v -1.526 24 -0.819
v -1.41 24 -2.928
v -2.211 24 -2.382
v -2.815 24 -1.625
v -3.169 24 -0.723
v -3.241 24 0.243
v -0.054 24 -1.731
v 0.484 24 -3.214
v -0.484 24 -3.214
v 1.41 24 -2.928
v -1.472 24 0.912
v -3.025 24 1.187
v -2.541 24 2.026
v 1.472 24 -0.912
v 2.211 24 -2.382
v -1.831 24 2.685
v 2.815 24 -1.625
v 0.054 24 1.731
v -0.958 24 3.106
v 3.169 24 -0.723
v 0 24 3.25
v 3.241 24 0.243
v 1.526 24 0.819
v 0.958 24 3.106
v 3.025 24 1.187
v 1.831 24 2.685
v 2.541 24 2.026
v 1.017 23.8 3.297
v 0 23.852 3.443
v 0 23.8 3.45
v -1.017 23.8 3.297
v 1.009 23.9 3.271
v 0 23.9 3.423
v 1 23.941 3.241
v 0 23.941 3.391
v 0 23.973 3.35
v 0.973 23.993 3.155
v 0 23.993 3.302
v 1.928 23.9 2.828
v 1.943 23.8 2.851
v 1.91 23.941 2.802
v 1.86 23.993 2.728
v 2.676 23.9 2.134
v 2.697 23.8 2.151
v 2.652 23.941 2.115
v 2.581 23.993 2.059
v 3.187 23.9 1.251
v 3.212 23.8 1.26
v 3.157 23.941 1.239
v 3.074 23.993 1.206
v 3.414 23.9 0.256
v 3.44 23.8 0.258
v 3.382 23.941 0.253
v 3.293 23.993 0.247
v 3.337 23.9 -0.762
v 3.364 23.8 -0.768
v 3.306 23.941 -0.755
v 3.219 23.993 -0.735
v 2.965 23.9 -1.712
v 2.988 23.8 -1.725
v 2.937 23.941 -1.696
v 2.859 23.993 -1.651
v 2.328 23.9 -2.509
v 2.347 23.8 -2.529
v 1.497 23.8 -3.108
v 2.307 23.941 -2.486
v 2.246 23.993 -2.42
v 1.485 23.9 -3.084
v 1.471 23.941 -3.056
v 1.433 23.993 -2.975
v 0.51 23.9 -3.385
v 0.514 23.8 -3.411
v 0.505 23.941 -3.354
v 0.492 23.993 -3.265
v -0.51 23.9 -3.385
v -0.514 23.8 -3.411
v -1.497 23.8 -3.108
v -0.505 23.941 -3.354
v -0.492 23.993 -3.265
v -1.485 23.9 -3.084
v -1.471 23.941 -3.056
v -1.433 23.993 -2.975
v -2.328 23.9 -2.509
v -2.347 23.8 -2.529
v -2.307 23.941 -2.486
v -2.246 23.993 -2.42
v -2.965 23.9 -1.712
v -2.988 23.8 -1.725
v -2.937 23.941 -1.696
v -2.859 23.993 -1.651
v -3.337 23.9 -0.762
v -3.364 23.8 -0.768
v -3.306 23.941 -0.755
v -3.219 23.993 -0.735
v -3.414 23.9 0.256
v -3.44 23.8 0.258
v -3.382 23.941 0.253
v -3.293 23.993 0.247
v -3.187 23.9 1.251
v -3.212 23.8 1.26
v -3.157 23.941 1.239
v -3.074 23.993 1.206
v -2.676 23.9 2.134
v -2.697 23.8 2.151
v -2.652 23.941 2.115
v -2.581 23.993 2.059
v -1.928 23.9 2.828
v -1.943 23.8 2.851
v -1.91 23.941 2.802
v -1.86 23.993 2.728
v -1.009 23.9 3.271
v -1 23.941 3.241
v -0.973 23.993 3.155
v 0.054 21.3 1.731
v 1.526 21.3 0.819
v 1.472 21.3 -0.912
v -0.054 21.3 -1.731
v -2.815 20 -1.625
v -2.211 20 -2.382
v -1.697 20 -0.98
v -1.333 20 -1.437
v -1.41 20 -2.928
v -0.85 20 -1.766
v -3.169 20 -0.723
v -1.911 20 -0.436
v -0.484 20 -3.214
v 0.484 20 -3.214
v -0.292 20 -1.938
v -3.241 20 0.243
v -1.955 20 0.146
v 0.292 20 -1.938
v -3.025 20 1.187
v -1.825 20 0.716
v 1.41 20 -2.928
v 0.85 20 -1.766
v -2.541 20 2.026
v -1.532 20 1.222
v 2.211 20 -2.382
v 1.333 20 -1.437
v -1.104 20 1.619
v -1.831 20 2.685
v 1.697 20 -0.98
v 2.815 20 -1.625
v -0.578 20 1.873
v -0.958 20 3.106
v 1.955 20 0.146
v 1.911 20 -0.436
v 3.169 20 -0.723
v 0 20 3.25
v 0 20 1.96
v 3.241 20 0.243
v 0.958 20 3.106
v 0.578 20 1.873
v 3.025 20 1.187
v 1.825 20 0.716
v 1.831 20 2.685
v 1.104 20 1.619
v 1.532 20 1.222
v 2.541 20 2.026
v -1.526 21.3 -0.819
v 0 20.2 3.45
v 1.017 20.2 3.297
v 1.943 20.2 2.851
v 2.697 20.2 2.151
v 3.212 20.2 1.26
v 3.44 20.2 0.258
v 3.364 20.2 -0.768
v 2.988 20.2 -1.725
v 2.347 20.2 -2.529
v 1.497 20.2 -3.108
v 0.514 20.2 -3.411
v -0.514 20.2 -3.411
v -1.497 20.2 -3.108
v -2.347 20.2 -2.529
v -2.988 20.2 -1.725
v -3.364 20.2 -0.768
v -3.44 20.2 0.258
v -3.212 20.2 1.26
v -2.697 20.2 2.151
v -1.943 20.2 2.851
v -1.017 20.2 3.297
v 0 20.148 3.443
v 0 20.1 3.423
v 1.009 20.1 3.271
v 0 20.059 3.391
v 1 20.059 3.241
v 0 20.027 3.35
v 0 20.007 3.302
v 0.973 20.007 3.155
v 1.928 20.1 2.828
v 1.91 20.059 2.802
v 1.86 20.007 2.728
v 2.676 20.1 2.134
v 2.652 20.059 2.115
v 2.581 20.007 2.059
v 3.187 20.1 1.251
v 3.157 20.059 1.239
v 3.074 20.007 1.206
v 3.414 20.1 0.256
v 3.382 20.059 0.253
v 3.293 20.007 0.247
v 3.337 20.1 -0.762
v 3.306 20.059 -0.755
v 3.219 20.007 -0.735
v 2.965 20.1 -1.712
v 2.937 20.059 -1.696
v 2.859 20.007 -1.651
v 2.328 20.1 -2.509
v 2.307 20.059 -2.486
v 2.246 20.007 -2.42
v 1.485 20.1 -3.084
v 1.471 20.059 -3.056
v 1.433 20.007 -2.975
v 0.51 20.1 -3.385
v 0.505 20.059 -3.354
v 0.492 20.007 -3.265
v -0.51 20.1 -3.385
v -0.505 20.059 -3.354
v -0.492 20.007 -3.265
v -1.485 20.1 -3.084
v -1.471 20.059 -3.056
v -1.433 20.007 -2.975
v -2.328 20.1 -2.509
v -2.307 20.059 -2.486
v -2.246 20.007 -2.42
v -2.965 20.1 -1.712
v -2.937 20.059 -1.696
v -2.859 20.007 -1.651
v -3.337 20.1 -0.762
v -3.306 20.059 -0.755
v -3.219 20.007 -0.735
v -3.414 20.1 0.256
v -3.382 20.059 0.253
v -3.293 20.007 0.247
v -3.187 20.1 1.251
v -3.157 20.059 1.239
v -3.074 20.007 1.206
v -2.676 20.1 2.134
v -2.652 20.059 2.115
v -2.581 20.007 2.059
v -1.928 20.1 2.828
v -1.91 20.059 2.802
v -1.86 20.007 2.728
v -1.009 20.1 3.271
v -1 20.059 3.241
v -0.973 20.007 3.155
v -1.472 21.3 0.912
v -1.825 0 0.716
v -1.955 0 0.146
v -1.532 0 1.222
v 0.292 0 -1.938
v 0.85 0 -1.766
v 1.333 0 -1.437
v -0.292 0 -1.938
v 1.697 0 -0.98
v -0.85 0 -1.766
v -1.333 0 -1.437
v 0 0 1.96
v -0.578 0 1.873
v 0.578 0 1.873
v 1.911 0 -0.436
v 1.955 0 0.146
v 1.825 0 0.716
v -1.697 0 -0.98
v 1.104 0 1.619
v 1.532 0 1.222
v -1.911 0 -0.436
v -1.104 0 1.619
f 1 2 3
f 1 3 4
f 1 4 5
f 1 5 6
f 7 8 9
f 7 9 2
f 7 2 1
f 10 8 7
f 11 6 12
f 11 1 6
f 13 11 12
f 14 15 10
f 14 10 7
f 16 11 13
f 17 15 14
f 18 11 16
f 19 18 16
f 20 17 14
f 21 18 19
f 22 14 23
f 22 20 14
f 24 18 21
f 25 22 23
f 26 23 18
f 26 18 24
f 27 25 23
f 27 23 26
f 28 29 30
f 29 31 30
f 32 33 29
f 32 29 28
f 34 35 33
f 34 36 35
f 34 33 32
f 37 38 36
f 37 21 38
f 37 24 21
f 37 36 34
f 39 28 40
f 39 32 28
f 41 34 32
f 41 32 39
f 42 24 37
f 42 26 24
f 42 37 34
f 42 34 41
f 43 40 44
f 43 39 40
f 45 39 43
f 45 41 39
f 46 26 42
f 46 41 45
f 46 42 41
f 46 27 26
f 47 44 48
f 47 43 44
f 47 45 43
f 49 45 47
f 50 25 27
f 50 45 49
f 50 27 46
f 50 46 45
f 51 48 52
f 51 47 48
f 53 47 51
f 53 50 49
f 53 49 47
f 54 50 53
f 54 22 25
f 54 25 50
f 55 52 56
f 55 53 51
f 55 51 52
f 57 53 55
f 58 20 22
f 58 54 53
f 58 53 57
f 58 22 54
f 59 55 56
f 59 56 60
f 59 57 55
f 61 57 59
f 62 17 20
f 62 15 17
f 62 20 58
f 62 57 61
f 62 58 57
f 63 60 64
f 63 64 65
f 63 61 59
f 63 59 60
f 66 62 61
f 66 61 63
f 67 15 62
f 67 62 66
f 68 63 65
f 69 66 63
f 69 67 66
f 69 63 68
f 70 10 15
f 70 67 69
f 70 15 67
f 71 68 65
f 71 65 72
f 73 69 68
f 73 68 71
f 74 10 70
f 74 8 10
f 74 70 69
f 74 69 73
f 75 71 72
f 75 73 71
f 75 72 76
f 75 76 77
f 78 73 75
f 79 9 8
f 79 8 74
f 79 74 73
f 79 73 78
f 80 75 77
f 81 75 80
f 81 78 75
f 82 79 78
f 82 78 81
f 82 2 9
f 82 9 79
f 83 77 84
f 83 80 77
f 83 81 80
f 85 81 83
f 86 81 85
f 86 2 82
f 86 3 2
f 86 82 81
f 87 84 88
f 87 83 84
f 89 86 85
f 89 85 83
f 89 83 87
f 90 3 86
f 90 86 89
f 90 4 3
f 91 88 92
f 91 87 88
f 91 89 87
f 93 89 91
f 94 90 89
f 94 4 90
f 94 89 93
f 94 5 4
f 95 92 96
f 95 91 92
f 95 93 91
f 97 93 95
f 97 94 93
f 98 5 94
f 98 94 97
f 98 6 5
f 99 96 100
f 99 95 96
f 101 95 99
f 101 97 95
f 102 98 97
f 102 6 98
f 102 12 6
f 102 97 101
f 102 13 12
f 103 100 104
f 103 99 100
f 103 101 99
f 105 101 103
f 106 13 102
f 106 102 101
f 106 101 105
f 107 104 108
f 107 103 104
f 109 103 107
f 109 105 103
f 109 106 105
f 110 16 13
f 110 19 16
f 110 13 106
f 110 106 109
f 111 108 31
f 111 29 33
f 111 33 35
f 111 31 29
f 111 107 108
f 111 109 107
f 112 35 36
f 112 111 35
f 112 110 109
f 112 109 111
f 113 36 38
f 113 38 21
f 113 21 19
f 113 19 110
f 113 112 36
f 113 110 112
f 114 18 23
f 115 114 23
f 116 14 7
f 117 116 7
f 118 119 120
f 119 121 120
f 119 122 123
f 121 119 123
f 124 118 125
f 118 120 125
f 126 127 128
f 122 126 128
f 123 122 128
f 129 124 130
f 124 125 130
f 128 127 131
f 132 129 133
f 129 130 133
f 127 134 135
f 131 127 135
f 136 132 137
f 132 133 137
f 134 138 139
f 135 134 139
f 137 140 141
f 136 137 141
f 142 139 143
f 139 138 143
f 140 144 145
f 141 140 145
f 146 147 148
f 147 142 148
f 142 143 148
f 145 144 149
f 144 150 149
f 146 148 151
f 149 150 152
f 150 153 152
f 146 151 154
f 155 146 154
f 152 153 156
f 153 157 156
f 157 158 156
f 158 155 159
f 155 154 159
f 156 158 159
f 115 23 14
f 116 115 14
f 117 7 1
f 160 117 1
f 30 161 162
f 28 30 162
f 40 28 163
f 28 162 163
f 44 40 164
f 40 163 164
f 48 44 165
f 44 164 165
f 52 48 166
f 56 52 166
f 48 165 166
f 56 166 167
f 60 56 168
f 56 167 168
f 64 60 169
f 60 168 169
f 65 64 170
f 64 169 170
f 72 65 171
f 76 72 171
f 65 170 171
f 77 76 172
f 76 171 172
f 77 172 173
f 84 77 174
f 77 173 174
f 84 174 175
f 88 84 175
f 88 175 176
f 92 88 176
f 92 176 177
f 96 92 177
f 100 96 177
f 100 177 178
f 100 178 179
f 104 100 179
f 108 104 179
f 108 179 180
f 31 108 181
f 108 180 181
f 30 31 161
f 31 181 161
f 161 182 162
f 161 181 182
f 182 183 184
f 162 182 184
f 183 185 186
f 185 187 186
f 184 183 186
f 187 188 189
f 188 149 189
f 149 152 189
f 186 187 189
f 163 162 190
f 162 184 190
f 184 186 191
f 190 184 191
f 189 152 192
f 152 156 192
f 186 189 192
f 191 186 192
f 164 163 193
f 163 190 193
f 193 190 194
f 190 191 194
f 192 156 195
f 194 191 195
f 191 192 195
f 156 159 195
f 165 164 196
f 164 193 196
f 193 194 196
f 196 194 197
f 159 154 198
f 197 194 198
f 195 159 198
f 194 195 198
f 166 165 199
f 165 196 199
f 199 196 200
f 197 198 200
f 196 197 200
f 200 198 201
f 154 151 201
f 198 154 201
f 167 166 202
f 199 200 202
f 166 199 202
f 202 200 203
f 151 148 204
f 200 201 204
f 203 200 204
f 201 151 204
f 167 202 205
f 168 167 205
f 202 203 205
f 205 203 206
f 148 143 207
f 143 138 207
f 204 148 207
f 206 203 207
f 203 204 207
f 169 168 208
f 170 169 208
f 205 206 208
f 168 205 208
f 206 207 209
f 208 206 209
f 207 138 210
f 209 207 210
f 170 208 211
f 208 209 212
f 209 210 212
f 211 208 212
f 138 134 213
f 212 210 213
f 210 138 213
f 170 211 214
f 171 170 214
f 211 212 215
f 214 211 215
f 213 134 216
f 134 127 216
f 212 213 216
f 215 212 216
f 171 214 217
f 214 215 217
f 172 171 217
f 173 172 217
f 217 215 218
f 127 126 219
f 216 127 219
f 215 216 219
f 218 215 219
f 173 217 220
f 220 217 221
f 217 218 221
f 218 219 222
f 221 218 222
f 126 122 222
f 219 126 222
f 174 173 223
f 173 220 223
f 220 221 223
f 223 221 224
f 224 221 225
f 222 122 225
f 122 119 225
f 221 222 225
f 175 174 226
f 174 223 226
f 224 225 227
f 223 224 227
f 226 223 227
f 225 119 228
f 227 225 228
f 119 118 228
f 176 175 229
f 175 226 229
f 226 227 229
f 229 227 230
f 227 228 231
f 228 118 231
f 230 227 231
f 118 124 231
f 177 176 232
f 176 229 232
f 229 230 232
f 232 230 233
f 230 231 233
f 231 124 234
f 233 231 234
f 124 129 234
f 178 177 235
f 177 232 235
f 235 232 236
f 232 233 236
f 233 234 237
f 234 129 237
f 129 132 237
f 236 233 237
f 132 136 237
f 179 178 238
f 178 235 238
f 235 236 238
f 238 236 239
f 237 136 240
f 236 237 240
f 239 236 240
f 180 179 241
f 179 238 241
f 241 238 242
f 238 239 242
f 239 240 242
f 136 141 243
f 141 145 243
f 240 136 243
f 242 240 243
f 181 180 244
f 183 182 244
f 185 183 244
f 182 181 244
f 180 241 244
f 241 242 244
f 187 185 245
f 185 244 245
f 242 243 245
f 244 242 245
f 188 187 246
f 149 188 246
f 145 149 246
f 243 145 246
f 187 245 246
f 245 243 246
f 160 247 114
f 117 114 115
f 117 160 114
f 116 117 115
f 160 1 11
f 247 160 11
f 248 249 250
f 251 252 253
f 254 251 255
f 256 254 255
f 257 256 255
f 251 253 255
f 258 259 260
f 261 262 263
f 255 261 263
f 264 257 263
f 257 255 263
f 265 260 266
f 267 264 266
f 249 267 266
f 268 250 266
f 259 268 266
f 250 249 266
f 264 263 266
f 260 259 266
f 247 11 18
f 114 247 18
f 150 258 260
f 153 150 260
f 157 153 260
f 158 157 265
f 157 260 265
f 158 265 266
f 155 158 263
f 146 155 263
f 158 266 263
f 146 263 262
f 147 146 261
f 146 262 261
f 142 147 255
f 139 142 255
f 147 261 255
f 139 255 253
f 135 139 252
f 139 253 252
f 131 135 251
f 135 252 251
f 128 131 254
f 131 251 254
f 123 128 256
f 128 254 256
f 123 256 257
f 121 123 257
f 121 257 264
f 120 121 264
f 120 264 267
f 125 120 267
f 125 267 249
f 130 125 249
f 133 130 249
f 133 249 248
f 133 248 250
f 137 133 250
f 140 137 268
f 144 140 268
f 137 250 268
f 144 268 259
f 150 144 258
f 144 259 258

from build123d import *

# Parameters (mm, degrees)
SKETCH1_R           = 1.96
BOSS_EXTRUDE1_DEPTH = 20
SKETCH2_R           = 3.45
BOSS_EXTRUDE2_DEPTH = 4
CUT_EXTRUDE1_DEPTH  = 2.7
FILLET1_R           = 0.2


with BuildPart() as part:
    # Sketch1 → Boss-Extrude1 (new body)
    with BuildSketch(Plane(origin=(0, 0, 0), x_dir=(1, 0, 0), z_dir=(0, 1, 0))):
        with Locations(Location((0, 0, 0), (0, 0, 270))):
            Circle(SKETCH1_R)
    extrude(amount=BOSS_EXTRUDE1_DEPTH)

    # Sketch2 → Boss-Extrude2 (add)
    with BuildSketch(Plane(origin=(0, 20, 0), x_dir=(1, 0, 0), z_dir=(0, 1, 0))):
        with Locations(Location((0, 0, 0), (0, 0, 270))):
            Circle(SKETCH2_R)
    extrude(amount=BOSS_EXTRUDE2_DEPTH)

    # Sketch3 → Cut-Extrude1 (cut)
    with BuildSketch(Plane(origin=(0, 24, 0), x_dir=(1, 0, 0), z_dir=(0, 1, 0))):
        Polygon((-0.053621876, 1.731220579), (-1.526091939, 0.819172383), (-1.472470063, -0.912048197), (0.053621876, -1.731220579), (1.526091939, -0.819172383), (1.472470063, 0.912048197), align=None)
    extrude(amount=-CUT_EXTRUDE1_DEPTH, mode=Mode.SUBTRACT)

    # Fillet1
    fillet1_edges = [part.edges().sort_by_distance(p)[0] for p in [
        (0, 20, -3.45),
        (0, 24, -3.45),
    ]]
    fillet(fillet1_edges, radius=FILLET1_R)


solid = part.part
